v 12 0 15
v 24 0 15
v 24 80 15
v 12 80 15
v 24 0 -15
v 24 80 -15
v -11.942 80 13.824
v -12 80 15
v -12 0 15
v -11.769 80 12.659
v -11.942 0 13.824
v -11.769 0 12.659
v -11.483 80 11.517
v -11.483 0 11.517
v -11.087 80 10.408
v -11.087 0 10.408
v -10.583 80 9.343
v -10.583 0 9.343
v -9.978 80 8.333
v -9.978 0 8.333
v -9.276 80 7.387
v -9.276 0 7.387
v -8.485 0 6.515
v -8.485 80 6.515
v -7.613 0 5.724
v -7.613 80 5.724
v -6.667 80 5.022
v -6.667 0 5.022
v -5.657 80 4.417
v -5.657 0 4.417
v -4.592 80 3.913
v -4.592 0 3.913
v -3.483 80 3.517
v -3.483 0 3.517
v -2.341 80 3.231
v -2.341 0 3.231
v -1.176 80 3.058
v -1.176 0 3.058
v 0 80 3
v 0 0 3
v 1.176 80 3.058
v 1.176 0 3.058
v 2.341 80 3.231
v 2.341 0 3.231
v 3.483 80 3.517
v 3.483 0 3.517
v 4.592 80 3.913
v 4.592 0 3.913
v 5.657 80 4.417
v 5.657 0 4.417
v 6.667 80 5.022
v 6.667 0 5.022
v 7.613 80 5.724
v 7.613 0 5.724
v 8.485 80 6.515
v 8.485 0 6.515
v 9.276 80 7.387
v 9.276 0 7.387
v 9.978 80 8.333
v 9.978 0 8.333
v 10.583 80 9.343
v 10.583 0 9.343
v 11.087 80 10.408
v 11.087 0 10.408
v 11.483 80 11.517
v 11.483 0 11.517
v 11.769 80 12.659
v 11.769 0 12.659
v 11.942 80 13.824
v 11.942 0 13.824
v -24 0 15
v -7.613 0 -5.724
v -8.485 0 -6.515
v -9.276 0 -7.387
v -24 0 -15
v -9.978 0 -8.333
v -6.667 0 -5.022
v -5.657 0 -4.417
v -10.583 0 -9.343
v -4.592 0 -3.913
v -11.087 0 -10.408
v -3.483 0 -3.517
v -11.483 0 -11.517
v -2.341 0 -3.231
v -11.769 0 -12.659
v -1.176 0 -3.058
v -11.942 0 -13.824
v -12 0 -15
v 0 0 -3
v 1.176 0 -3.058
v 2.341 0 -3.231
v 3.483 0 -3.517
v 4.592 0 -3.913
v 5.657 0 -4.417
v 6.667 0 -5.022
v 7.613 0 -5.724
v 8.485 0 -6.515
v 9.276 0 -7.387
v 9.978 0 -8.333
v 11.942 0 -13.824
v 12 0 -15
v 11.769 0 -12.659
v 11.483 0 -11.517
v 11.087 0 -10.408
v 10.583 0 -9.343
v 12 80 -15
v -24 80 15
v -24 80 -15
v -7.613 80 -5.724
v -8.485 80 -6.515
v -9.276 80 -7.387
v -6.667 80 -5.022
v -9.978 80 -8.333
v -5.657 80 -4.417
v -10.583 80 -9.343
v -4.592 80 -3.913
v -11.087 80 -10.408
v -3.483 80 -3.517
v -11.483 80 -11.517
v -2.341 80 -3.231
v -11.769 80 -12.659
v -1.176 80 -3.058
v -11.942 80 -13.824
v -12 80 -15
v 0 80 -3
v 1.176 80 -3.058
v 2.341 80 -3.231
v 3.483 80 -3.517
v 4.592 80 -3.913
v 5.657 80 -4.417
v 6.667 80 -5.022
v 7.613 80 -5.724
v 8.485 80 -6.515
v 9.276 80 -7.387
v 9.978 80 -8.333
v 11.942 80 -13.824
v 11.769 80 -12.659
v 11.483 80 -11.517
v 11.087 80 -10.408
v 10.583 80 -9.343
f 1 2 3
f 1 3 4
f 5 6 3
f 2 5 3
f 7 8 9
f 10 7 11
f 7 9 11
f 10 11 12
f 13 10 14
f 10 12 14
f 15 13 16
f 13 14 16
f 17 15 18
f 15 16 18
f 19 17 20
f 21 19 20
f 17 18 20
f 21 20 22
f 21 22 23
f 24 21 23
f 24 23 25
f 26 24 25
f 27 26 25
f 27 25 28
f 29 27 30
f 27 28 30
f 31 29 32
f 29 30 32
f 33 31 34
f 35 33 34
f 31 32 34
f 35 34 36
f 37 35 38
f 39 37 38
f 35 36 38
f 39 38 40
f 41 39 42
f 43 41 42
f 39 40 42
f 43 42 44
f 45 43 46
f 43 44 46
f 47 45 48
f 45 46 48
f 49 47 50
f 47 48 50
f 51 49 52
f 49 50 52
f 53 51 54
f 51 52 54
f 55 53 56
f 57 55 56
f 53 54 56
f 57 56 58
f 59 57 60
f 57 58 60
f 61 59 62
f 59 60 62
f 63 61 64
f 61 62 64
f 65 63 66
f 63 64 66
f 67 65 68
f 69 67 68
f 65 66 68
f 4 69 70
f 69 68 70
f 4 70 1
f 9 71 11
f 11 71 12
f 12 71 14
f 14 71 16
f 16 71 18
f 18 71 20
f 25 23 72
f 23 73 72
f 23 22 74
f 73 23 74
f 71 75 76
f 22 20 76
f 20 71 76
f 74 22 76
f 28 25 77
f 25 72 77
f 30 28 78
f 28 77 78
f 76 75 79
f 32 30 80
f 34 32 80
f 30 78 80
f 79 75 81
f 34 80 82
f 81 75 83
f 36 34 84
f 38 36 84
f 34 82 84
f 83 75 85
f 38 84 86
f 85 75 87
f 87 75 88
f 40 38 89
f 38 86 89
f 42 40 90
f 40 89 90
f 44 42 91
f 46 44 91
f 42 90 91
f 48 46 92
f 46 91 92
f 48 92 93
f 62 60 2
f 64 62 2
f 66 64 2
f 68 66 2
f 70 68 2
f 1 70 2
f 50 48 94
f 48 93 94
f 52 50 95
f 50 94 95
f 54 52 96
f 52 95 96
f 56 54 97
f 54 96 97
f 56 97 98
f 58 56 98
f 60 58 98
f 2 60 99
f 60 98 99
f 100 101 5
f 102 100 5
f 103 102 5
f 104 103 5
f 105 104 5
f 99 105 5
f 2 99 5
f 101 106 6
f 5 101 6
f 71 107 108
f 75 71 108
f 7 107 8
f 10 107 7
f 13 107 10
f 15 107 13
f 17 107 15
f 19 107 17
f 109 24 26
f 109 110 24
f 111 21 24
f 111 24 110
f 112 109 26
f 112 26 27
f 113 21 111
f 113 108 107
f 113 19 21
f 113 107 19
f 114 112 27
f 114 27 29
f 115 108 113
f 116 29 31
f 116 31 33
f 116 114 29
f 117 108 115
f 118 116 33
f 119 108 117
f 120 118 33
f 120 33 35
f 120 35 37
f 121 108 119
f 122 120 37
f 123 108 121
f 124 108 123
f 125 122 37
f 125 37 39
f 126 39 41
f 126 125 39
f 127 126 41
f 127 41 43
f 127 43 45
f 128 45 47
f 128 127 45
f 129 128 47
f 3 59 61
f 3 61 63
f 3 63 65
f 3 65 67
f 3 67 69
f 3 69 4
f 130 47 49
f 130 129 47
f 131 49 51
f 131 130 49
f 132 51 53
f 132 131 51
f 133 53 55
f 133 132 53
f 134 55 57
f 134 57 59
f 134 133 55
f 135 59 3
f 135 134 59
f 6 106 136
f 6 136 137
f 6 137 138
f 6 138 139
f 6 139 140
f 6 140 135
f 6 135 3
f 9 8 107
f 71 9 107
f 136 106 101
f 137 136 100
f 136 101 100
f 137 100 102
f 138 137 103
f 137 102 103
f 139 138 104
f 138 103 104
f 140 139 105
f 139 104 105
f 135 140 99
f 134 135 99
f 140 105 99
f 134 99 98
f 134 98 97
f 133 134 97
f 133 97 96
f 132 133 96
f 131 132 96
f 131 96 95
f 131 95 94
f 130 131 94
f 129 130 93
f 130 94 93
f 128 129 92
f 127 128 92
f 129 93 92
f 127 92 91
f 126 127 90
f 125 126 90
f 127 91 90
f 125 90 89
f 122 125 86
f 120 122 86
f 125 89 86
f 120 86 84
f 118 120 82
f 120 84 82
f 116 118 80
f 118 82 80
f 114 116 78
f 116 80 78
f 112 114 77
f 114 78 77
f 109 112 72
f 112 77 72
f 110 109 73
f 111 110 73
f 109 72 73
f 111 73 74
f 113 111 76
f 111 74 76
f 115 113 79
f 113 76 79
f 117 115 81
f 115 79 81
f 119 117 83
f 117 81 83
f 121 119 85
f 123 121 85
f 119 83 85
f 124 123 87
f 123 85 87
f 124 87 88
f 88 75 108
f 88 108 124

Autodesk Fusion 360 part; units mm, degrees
sketch "Sketch1" plane through (0, 0, 0) normal (0, 0, 1) x (1, 0, 0)
sketch "Sketch2" plane through (0, 0, 0) normal (0, 1, 0) x (1, 0, 0)
  line L0 (24, -15) -> (-24, -15)
  line L1 (-24, -15) -> (-24, 15)
  line L2 (-24, 15) -> (24, 15)
  line L3 (24, 15) -> (24, -15)
  line L4 (24, -15) -> (-24, 15) construction
  line L5 (-24, -15) -> (24, 15) construction
  dimension "d3" = 48
  dimension "d4" = 30
extrude "Extrude1" add sketch "Sketch2" along normal blind 80
sketch "Sketch3" plane through (0, 0, 0) normal (0, -1, 0) x (1, 0, 0)
  line L0 (-24, -15) -> (24, -15)
  line L1 (24, -15) -> (24, 15)
  line L2 (24, 15) -> (-24, 15)
  line L3 (-24, 15) -> (-24, -15)
  arc A0 (-12, 15) -> (12, 15) centre (0, 15) ccw
  arc A1 (12, -15) -> (-12, -15) centre (0, -15) ccw
  line L4 (-12, -15) -> (12, -15)
  line L5 (12, 15) -> (-12, 15)
  dimension "d7" = 12
  dimension "d8" = 12
extrude "Extrude2" cut sketch "Sketch3" against normal blind 80 contours L0 A1 L4 | L2 A0 L5
